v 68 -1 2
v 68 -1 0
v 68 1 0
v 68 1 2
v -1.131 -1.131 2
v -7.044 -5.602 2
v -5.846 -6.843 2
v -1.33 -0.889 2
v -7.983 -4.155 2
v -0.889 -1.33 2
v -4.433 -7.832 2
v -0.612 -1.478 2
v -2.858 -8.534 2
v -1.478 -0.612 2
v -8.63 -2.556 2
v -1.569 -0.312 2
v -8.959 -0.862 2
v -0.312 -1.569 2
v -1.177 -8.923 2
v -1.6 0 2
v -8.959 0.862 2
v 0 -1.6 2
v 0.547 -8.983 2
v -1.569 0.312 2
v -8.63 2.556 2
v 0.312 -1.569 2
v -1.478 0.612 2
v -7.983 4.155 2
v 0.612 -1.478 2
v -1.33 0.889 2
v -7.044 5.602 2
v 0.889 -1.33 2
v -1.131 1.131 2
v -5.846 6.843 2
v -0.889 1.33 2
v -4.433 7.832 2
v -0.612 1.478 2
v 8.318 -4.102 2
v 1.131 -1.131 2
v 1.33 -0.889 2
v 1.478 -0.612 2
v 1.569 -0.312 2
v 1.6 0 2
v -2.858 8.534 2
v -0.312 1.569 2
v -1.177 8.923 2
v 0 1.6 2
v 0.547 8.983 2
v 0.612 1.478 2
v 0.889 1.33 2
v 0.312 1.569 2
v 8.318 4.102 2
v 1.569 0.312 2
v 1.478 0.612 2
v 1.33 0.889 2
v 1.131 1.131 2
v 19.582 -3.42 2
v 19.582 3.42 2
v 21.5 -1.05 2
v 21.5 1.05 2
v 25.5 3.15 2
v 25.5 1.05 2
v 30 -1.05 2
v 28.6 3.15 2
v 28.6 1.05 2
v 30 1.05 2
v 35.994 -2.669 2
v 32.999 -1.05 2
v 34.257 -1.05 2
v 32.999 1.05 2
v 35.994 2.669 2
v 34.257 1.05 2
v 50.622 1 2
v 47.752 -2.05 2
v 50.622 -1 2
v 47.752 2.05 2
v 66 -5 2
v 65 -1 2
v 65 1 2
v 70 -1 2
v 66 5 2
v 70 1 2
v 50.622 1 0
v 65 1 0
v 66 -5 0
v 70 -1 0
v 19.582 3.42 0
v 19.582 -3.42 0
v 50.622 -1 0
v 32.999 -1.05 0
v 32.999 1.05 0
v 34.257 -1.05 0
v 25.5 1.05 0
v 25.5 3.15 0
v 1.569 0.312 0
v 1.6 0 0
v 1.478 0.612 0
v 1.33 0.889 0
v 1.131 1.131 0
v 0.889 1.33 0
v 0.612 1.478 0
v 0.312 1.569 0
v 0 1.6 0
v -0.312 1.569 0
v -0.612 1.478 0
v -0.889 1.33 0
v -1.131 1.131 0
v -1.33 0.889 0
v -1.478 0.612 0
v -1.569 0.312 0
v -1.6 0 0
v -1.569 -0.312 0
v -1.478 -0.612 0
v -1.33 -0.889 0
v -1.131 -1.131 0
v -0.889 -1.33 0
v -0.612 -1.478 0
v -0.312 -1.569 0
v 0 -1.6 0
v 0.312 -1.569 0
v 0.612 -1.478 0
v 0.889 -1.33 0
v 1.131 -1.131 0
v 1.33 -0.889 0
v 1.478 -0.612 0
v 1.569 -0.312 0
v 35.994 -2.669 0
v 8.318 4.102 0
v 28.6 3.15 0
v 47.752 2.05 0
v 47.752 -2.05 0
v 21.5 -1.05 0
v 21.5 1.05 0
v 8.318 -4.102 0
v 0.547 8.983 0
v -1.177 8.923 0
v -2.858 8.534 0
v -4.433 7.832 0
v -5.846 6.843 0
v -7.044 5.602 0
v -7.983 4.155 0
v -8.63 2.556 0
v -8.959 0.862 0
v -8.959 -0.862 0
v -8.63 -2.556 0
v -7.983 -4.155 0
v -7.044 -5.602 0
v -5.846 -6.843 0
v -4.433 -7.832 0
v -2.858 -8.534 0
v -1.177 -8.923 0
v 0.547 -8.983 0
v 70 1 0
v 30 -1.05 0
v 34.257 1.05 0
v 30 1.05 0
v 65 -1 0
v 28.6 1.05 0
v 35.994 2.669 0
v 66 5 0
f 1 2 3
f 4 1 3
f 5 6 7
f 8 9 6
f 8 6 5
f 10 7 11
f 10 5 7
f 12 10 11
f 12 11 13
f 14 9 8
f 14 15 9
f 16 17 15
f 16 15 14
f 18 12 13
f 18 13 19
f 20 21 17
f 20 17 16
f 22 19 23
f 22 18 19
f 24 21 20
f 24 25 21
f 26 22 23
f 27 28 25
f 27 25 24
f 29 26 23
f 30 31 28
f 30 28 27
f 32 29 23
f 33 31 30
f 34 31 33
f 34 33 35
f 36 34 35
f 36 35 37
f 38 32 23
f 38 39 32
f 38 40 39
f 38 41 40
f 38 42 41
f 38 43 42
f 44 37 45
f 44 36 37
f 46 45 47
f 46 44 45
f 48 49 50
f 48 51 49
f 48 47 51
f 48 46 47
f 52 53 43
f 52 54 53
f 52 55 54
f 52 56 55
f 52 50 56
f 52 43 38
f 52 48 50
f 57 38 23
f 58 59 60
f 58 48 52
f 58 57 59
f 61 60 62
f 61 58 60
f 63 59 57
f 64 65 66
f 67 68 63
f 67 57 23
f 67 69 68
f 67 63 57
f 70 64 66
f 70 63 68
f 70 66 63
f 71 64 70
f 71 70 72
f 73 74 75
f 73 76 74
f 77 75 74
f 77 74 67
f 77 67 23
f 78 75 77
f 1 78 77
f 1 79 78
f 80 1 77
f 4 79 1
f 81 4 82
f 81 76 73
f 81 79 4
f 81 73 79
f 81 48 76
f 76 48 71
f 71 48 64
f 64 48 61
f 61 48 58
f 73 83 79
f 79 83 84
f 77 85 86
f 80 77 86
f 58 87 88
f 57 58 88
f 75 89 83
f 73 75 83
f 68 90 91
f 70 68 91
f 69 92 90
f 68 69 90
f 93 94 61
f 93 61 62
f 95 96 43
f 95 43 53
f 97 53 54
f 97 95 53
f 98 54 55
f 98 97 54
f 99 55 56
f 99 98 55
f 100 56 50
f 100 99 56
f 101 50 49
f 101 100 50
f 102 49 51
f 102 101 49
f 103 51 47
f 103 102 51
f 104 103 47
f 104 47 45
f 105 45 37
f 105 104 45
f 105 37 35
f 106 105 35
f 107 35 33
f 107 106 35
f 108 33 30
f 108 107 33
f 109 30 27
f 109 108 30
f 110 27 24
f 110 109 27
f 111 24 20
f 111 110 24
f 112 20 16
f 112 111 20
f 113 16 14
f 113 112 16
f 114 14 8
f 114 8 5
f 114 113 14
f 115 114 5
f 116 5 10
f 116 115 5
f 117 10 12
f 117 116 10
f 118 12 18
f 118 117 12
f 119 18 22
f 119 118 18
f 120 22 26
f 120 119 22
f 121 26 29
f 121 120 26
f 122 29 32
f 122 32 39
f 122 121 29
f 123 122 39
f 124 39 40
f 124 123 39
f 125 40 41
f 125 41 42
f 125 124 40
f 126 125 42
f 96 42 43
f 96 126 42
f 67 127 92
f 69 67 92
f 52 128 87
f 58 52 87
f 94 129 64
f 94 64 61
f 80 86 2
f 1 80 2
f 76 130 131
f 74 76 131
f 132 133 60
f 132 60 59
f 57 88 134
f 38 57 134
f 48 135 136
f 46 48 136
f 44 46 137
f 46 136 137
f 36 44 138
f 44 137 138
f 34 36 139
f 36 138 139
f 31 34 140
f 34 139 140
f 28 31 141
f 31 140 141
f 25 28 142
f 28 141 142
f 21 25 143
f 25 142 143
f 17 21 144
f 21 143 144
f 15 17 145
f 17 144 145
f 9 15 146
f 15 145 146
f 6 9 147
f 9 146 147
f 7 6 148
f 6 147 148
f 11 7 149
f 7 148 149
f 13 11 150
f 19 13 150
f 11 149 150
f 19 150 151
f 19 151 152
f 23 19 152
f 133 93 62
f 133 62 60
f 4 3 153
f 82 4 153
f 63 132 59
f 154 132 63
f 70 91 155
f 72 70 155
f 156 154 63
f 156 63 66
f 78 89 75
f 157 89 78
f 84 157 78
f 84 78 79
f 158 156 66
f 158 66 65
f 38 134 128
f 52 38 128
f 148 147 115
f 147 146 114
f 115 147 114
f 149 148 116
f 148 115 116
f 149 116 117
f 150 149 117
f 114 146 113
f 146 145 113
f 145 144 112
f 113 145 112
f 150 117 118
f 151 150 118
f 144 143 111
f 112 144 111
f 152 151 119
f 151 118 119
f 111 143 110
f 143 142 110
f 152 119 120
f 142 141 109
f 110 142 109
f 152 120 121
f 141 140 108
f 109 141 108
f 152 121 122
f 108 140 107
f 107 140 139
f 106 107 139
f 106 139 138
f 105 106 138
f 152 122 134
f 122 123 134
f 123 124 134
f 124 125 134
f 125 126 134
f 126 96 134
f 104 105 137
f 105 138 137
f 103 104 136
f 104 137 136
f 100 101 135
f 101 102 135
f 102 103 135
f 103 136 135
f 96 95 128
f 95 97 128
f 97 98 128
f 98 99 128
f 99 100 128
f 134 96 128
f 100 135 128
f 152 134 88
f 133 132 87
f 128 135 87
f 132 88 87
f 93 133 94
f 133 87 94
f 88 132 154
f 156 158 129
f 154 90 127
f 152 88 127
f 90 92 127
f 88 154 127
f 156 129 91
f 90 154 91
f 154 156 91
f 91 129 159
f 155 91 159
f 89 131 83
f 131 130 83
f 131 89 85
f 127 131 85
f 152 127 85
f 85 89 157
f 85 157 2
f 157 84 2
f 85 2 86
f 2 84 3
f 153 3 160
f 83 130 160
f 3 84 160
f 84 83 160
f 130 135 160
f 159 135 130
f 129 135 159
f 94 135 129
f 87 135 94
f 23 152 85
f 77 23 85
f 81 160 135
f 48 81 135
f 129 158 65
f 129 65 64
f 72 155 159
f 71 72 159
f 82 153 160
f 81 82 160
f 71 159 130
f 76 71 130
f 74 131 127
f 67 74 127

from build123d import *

# Parameters (mm, degrees)
SKETCH_1_R      = 1.6
SKETCH_1_W      = 14.377962021
SKETCH_1_H      = 2
EXTRUDE_1_DEPTH = 2


with BuildPart() as part:
    # 草图1 → 凸台-拉伸1 (new body)
    with BuildSketch(Plane.XY):
        with BuildLine():
            Line((68, 1), (70, 1))
            Line((70, 1), (66, 5))
            Line((66, 5), (0.546713687, 8.983379328))
            ThreePointArc((0.546713687, 8.983379328), (-9, 0), (0.546713687, -8.983379328))
            Line((0.546713687, -8.983379328), (66, -5))
            Line((66, -5), (70, -1))
            Line((70, -1), (68, -1))
            Line((68, -1), (68, 1))
        make_face()
        Circle(SKETCH_1_R, mode=Mode.SUBTRACT)
        Polygon((30, 1.05), (28.6, 1.05), (28.6, 3.15), (25.5, 3.15), (25.5, 1.05), (21.5, 1.05), (21.5, -1.05), (30, -1.05), align=None, mode=Mode.SUBTRACT)
        Polygon((8.317846196, 4.101632549), (19.58225642, 3.420369402), (19.58225642, -3.420369402), (8.317846196, -4.101632549), align=None, mode=Mode.SUBTRACT)
        with Locations((57.811018989, 0)):
            Rectangle(SKETCH_1_W, SKETCH_1_H, mode=Mode.SUBTRACT)
        Polygon((47.752262622, -2.05), (35.993942407, -2.669181187), (34.25663283, -1.05), (32.998759736, -1.05), (32.998759736, 1.05), (34.25663283, 1.05), (35.993942407, 2.669181187), (47.752262622, 2.05), align=None, mode=Mode.SUBTRACT)
    extrude(amount=EXTRUDE_1_DEPTH)


solid = part.part
